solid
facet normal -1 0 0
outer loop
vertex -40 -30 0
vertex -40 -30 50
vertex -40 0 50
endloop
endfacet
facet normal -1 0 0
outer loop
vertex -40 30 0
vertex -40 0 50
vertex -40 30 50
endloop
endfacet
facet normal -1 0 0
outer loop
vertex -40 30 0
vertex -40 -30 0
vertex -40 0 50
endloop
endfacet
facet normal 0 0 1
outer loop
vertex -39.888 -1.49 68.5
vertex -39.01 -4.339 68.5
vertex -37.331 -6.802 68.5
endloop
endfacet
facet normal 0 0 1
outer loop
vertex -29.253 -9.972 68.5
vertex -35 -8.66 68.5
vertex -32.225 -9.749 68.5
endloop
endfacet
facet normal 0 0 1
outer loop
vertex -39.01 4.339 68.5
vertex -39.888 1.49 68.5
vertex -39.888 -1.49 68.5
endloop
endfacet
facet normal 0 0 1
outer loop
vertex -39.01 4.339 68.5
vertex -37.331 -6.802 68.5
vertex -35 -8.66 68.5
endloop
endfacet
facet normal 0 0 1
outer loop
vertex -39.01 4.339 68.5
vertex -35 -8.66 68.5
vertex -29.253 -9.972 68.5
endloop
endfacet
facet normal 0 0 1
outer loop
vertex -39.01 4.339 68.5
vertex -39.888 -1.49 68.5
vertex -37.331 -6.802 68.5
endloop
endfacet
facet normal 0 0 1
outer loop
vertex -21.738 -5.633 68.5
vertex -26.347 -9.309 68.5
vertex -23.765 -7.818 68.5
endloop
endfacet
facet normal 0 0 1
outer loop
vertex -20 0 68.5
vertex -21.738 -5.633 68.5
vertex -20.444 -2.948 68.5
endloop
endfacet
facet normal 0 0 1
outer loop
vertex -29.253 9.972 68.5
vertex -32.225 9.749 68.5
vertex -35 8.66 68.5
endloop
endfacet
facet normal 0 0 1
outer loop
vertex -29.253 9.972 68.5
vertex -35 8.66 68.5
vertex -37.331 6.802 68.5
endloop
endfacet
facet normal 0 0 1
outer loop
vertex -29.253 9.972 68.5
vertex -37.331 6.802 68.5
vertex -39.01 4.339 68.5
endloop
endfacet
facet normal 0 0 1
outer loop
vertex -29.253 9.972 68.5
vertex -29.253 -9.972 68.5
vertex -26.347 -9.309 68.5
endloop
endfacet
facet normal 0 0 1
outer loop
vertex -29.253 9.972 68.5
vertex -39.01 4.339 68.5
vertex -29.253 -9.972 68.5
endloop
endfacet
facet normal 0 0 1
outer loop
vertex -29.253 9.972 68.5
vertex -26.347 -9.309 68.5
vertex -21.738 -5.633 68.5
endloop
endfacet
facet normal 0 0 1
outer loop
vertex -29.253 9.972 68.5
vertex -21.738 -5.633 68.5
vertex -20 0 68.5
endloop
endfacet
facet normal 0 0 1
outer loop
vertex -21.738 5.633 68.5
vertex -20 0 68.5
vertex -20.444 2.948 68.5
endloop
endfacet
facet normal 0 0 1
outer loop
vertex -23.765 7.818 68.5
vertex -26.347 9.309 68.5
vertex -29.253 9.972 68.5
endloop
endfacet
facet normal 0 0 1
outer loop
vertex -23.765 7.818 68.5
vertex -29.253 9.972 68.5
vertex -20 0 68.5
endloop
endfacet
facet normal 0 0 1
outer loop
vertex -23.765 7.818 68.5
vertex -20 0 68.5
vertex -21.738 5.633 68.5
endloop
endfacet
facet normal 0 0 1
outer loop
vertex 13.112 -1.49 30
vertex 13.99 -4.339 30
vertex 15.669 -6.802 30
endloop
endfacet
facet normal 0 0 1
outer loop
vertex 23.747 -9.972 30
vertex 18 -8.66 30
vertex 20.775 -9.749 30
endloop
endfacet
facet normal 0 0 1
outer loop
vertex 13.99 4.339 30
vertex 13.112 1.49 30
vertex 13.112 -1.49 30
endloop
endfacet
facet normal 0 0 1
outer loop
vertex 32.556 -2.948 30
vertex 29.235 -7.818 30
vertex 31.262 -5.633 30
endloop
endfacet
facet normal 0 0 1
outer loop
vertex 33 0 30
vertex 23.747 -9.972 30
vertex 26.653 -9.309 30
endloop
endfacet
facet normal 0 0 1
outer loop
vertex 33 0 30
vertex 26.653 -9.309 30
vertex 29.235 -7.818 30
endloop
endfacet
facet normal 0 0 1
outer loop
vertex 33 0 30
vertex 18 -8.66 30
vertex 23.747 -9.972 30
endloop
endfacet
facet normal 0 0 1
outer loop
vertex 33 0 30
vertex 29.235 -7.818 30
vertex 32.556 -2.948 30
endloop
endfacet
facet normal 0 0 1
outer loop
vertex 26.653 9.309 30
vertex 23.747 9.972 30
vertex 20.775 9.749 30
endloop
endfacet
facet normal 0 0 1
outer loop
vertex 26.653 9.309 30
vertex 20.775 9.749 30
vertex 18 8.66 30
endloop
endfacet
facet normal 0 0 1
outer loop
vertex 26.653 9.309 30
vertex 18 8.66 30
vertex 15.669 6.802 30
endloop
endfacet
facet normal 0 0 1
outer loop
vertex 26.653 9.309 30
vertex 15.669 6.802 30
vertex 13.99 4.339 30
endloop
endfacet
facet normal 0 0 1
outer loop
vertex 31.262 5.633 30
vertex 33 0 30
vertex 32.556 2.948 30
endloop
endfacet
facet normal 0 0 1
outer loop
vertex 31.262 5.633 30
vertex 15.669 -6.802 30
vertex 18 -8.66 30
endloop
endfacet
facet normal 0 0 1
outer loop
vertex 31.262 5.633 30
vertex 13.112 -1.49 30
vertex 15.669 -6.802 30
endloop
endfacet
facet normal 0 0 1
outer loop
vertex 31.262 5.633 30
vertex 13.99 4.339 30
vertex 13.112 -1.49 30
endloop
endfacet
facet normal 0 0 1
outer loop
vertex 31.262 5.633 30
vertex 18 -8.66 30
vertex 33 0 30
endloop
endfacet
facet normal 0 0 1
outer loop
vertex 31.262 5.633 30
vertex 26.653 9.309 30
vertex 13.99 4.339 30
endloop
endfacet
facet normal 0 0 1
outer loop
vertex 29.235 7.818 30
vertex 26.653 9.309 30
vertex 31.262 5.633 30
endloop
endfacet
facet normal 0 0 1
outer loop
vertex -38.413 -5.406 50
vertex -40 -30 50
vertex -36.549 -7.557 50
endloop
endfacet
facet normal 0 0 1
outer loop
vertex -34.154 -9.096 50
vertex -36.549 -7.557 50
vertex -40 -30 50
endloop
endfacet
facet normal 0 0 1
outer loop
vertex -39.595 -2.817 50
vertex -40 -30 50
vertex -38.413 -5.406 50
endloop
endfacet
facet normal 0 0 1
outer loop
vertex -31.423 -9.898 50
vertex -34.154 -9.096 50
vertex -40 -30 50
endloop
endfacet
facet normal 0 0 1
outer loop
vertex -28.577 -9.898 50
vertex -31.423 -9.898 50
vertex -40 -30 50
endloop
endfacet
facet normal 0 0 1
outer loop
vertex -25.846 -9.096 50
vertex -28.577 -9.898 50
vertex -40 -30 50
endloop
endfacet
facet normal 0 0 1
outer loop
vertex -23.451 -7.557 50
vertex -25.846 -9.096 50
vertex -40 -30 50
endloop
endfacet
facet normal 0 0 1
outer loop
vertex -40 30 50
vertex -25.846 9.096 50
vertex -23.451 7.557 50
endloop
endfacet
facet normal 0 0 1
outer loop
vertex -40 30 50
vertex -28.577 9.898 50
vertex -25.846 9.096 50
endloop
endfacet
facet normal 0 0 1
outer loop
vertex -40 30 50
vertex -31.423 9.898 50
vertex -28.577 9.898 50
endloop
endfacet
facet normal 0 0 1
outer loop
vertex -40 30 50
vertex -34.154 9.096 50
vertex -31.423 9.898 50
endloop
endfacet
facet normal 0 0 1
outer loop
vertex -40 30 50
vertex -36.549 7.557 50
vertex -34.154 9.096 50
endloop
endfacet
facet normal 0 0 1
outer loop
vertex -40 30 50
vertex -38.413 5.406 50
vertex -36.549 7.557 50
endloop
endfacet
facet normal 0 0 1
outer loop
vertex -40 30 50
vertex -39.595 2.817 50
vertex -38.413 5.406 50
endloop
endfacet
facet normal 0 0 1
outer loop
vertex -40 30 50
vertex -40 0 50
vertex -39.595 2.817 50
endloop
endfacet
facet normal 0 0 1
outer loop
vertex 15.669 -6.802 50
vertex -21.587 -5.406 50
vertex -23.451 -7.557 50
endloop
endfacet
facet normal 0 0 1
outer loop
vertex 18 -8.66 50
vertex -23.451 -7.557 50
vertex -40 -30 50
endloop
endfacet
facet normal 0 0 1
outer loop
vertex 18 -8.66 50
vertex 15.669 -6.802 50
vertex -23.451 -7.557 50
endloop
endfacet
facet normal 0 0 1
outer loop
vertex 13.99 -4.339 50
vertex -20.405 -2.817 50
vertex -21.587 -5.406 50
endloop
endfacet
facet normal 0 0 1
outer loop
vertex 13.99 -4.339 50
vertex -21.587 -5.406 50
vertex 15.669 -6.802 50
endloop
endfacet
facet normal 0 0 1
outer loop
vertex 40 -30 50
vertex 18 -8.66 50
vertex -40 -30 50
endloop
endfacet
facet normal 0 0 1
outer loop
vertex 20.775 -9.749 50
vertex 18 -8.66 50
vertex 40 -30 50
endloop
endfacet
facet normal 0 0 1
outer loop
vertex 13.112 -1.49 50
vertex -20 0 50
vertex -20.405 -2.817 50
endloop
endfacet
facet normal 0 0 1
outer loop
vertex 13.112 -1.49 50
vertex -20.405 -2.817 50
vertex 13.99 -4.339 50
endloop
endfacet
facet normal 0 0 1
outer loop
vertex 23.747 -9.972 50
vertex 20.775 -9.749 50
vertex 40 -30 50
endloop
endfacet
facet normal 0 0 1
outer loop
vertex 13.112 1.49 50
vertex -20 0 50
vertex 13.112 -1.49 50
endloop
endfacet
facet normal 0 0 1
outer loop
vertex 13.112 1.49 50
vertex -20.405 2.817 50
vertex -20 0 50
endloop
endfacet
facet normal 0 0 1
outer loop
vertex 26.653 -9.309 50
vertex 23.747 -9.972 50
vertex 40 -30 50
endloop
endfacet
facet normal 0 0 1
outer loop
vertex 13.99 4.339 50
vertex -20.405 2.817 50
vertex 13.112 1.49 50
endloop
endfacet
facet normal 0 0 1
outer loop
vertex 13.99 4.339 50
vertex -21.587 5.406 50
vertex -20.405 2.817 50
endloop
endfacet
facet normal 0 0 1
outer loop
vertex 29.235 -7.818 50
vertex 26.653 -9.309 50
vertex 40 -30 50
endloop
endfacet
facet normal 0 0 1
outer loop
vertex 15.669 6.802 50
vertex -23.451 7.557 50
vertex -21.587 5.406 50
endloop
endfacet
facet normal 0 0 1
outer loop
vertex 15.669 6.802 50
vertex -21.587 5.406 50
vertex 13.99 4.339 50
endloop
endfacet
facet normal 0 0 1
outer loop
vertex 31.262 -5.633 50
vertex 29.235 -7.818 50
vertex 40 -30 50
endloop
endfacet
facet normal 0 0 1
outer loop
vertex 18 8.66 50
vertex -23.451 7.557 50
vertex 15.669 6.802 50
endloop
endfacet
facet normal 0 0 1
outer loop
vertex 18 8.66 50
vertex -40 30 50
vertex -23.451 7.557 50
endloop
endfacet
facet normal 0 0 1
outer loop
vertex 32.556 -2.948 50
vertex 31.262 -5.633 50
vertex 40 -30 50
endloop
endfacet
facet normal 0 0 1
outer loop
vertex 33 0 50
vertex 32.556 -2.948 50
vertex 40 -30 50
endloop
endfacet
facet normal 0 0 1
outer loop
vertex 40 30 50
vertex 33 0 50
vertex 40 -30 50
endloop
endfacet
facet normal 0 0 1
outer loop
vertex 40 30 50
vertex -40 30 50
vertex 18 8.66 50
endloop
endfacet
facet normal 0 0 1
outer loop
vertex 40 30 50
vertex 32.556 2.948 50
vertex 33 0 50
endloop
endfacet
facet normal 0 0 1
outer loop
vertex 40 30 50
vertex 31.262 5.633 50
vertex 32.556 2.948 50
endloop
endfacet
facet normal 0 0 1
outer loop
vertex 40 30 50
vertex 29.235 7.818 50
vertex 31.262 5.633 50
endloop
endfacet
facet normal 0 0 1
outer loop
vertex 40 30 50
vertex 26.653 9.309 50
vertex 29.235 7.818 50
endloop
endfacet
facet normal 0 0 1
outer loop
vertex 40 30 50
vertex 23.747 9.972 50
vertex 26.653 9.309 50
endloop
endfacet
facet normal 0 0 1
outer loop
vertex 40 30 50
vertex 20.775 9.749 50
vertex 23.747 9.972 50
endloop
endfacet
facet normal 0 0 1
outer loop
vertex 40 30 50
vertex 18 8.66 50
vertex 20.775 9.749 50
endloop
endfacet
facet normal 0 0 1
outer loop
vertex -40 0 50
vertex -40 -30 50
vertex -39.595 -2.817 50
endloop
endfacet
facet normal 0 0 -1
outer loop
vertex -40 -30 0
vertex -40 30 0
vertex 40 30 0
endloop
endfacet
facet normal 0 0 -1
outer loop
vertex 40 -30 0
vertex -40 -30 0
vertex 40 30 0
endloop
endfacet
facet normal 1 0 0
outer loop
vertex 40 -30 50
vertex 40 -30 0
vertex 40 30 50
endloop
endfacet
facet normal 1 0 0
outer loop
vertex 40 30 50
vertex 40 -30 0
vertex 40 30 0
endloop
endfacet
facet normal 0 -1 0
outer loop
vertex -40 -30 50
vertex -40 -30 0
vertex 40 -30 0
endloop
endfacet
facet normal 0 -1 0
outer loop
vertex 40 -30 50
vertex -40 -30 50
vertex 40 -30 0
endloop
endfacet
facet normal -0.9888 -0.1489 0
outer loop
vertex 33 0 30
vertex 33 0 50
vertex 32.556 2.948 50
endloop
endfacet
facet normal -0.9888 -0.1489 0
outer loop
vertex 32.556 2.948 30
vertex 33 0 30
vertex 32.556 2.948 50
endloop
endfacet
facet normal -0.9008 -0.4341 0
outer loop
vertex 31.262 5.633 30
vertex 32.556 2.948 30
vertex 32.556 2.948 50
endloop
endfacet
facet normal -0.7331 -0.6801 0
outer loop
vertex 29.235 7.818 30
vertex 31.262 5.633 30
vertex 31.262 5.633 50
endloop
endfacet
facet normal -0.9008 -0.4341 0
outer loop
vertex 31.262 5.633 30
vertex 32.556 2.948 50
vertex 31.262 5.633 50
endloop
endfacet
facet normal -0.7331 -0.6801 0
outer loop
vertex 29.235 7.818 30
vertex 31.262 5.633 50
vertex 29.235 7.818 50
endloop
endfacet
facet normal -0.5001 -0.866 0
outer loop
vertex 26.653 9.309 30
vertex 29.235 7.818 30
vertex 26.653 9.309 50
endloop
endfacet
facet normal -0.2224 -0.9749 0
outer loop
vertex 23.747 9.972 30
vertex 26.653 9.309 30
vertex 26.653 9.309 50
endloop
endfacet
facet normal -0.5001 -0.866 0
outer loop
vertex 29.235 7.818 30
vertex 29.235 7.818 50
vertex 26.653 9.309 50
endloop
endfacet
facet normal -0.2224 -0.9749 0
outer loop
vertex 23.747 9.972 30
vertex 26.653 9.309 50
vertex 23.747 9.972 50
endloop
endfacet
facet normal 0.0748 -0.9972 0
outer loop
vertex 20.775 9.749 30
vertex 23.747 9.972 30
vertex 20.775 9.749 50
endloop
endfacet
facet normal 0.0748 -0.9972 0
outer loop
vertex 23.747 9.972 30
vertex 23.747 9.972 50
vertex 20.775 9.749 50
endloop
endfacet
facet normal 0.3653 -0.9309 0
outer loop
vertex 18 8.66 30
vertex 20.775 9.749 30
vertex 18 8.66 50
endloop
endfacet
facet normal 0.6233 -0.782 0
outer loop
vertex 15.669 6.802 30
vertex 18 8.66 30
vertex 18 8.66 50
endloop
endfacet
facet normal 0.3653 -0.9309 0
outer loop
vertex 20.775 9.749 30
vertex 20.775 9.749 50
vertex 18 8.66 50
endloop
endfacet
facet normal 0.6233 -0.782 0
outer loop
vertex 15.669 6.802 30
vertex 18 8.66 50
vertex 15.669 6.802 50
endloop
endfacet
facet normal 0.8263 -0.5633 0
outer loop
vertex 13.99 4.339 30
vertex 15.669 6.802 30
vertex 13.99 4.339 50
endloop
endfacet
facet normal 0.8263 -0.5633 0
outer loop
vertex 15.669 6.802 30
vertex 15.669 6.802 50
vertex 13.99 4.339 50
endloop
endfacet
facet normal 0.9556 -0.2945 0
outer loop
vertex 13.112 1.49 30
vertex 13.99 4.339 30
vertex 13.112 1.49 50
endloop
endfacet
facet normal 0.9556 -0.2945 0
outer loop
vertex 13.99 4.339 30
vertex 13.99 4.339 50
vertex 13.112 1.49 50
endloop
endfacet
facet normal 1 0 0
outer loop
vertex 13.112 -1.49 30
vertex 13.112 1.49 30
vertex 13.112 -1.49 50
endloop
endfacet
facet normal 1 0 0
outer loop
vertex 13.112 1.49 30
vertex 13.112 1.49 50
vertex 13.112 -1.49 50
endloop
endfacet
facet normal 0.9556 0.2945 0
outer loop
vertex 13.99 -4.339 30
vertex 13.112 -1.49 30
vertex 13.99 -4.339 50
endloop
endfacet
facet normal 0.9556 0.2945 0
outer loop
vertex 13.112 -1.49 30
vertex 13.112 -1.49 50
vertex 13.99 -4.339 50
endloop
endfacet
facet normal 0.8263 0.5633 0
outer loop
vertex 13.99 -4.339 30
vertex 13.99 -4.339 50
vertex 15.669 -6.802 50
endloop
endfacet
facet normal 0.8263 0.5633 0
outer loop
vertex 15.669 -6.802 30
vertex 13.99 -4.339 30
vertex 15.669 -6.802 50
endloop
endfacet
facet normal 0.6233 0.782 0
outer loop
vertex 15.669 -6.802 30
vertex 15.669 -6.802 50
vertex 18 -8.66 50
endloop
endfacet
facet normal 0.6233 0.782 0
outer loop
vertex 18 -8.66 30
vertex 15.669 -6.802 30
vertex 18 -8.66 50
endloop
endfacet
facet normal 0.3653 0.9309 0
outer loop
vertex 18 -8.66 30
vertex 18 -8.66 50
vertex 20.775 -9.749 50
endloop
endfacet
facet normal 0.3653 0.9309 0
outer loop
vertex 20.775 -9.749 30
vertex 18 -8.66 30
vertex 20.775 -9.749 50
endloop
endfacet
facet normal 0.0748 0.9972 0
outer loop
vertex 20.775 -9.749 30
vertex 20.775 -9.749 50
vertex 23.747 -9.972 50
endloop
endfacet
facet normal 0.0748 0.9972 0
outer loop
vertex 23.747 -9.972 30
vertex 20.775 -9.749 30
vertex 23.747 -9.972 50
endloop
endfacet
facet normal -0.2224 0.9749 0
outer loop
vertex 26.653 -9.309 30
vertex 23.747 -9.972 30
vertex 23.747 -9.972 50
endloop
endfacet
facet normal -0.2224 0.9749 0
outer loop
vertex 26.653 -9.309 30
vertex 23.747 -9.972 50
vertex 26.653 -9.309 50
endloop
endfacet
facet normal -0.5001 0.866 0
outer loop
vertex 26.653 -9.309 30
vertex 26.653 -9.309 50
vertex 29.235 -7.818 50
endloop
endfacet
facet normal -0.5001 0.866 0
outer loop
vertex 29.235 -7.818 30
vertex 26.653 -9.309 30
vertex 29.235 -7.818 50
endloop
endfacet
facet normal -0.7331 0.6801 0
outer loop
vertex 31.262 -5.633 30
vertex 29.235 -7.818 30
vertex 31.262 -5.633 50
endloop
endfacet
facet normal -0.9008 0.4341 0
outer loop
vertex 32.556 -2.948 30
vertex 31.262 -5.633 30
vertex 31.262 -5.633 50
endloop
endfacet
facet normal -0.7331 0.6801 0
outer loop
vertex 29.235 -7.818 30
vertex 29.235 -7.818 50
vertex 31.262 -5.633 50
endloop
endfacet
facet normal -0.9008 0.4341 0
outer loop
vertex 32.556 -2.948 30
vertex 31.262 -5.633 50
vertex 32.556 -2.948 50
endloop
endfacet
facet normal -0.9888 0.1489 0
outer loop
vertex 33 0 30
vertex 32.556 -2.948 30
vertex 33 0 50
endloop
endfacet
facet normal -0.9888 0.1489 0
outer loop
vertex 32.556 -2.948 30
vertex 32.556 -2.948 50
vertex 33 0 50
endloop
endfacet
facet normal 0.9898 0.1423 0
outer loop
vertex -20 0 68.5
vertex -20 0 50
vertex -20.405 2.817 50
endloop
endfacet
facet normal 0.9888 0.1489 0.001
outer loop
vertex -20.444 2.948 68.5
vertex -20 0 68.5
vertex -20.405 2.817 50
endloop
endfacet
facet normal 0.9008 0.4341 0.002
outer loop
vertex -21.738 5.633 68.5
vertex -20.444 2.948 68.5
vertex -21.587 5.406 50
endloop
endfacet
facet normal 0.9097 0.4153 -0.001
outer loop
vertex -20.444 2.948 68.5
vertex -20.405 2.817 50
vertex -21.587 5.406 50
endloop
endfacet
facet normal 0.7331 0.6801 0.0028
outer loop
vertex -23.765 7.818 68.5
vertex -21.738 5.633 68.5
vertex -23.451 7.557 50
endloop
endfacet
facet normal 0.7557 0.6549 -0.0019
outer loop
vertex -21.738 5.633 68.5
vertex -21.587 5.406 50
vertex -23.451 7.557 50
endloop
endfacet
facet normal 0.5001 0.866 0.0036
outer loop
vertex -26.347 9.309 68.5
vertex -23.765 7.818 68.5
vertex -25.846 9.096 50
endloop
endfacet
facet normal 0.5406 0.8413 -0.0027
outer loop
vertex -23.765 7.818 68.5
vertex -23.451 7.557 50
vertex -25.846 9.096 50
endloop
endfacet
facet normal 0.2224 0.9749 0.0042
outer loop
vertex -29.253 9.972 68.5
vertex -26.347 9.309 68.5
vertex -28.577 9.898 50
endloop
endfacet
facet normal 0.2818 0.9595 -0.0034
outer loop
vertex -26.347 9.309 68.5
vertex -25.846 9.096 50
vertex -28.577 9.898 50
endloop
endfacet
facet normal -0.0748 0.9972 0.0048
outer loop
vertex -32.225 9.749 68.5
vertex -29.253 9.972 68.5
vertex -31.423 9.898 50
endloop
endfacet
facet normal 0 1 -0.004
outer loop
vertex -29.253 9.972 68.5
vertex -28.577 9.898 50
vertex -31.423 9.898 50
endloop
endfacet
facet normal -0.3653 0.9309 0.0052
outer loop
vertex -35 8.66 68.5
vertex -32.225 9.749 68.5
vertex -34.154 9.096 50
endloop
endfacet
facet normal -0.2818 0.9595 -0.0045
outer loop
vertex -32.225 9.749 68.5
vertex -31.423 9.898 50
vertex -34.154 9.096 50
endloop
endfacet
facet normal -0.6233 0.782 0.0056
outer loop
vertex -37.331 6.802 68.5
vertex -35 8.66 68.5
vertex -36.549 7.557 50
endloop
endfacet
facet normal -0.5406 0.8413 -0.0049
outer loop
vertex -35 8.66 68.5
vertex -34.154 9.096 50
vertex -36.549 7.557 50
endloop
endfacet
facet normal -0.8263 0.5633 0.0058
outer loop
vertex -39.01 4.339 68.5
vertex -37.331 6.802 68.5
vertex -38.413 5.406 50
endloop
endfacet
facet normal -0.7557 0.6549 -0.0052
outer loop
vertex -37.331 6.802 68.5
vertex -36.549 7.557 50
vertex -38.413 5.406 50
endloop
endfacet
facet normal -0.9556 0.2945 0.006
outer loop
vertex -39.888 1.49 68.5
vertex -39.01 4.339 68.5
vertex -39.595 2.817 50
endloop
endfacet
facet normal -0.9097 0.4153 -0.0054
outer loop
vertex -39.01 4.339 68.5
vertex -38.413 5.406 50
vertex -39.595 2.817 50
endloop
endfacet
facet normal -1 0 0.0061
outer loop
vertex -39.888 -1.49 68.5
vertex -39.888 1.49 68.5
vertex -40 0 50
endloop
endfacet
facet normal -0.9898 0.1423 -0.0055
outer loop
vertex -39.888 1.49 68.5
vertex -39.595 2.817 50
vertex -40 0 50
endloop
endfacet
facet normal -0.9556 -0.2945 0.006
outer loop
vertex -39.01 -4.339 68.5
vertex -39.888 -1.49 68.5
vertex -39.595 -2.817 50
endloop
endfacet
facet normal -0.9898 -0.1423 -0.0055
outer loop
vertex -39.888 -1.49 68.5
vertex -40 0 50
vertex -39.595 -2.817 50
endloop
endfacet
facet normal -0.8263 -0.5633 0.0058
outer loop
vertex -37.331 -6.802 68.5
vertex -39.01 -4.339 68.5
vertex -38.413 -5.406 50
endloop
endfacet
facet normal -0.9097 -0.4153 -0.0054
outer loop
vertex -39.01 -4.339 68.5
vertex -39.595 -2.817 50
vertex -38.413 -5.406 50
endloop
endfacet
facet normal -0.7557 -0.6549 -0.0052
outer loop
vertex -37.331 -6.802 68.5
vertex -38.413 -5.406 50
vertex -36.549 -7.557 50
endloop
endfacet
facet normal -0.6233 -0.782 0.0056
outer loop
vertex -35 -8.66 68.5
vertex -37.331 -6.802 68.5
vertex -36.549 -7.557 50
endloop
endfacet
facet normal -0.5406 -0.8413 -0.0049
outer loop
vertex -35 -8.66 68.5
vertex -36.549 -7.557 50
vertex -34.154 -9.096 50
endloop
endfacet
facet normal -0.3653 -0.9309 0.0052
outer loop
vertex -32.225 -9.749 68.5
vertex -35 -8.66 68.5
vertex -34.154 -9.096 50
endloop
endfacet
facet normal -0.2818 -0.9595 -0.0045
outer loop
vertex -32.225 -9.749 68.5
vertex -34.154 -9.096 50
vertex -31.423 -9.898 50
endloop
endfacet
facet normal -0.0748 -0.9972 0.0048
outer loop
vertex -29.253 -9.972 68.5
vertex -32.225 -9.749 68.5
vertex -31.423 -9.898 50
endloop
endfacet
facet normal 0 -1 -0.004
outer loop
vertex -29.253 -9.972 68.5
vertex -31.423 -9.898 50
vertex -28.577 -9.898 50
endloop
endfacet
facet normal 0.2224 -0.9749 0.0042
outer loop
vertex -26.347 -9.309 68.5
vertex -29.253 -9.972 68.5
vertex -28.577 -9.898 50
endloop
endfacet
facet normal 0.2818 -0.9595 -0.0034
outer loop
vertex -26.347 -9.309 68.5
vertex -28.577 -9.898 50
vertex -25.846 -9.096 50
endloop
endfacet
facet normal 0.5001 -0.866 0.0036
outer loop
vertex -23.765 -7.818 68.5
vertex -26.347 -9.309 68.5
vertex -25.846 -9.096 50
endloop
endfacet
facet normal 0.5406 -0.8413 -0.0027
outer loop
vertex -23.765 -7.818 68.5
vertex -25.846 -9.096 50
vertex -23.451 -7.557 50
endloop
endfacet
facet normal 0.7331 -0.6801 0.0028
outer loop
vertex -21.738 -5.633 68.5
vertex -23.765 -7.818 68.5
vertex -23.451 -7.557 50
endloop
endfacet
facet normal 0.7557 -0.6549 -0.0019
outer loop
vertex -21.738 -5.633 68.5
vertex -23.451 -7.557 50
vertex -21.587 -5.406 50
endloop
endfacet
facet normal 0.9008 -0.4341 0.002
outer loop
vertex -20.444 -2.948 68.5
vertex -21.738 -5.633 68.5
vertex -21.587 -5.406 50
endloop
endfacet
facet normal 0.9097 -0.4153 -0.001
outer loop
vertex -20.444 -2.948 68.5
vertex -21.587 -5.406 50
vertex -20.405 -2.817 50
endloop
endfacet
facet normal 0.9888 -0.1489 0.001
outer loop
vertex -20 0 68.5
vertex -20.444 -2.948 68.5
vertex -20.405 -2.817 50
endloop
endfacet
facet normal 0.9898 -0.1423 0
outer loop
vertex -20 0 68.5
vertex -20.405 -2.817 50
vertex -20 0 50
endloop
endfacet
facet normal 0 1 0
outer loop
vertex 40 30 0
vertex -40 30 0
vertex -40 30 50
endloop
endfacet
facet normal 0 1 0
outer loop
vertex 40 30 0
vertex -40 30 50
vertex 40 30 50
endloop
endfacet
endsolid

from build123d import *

# Parameters (mm, degrees)
F0_W     = 80
F0_H     = 60
F1_DEPTH = 50
F2_R     = 10
F3_DEPTH = 18.5
F4_R     = 10
F5_DEPTH = 20


with BuildPart() as f1:
    # F0 (on Top) → F1 (new body)
    with BuildSketch(Plane.XY):
        Rectangle(F0_W, F0_H)
    extrude(amount=F1_DEPTH)

    # F2 (on face) → F3 (join)
    with BuildSketch(Plane.XY.offset(50)):
        with Locations((-30, 0)):
            Circle(F2_R)
    extrude(amount=F3_DEPTH)

    # F4 (on face) → F5 (cut)
    with BuildSketch(Plane.XY.offset(50)):
        with Locations((23, 0)):
            Circle(F4_R)
    extrude(amount=-F5_DEPTH, mode=Mode.SUBTRACT)


solid = f1.part
